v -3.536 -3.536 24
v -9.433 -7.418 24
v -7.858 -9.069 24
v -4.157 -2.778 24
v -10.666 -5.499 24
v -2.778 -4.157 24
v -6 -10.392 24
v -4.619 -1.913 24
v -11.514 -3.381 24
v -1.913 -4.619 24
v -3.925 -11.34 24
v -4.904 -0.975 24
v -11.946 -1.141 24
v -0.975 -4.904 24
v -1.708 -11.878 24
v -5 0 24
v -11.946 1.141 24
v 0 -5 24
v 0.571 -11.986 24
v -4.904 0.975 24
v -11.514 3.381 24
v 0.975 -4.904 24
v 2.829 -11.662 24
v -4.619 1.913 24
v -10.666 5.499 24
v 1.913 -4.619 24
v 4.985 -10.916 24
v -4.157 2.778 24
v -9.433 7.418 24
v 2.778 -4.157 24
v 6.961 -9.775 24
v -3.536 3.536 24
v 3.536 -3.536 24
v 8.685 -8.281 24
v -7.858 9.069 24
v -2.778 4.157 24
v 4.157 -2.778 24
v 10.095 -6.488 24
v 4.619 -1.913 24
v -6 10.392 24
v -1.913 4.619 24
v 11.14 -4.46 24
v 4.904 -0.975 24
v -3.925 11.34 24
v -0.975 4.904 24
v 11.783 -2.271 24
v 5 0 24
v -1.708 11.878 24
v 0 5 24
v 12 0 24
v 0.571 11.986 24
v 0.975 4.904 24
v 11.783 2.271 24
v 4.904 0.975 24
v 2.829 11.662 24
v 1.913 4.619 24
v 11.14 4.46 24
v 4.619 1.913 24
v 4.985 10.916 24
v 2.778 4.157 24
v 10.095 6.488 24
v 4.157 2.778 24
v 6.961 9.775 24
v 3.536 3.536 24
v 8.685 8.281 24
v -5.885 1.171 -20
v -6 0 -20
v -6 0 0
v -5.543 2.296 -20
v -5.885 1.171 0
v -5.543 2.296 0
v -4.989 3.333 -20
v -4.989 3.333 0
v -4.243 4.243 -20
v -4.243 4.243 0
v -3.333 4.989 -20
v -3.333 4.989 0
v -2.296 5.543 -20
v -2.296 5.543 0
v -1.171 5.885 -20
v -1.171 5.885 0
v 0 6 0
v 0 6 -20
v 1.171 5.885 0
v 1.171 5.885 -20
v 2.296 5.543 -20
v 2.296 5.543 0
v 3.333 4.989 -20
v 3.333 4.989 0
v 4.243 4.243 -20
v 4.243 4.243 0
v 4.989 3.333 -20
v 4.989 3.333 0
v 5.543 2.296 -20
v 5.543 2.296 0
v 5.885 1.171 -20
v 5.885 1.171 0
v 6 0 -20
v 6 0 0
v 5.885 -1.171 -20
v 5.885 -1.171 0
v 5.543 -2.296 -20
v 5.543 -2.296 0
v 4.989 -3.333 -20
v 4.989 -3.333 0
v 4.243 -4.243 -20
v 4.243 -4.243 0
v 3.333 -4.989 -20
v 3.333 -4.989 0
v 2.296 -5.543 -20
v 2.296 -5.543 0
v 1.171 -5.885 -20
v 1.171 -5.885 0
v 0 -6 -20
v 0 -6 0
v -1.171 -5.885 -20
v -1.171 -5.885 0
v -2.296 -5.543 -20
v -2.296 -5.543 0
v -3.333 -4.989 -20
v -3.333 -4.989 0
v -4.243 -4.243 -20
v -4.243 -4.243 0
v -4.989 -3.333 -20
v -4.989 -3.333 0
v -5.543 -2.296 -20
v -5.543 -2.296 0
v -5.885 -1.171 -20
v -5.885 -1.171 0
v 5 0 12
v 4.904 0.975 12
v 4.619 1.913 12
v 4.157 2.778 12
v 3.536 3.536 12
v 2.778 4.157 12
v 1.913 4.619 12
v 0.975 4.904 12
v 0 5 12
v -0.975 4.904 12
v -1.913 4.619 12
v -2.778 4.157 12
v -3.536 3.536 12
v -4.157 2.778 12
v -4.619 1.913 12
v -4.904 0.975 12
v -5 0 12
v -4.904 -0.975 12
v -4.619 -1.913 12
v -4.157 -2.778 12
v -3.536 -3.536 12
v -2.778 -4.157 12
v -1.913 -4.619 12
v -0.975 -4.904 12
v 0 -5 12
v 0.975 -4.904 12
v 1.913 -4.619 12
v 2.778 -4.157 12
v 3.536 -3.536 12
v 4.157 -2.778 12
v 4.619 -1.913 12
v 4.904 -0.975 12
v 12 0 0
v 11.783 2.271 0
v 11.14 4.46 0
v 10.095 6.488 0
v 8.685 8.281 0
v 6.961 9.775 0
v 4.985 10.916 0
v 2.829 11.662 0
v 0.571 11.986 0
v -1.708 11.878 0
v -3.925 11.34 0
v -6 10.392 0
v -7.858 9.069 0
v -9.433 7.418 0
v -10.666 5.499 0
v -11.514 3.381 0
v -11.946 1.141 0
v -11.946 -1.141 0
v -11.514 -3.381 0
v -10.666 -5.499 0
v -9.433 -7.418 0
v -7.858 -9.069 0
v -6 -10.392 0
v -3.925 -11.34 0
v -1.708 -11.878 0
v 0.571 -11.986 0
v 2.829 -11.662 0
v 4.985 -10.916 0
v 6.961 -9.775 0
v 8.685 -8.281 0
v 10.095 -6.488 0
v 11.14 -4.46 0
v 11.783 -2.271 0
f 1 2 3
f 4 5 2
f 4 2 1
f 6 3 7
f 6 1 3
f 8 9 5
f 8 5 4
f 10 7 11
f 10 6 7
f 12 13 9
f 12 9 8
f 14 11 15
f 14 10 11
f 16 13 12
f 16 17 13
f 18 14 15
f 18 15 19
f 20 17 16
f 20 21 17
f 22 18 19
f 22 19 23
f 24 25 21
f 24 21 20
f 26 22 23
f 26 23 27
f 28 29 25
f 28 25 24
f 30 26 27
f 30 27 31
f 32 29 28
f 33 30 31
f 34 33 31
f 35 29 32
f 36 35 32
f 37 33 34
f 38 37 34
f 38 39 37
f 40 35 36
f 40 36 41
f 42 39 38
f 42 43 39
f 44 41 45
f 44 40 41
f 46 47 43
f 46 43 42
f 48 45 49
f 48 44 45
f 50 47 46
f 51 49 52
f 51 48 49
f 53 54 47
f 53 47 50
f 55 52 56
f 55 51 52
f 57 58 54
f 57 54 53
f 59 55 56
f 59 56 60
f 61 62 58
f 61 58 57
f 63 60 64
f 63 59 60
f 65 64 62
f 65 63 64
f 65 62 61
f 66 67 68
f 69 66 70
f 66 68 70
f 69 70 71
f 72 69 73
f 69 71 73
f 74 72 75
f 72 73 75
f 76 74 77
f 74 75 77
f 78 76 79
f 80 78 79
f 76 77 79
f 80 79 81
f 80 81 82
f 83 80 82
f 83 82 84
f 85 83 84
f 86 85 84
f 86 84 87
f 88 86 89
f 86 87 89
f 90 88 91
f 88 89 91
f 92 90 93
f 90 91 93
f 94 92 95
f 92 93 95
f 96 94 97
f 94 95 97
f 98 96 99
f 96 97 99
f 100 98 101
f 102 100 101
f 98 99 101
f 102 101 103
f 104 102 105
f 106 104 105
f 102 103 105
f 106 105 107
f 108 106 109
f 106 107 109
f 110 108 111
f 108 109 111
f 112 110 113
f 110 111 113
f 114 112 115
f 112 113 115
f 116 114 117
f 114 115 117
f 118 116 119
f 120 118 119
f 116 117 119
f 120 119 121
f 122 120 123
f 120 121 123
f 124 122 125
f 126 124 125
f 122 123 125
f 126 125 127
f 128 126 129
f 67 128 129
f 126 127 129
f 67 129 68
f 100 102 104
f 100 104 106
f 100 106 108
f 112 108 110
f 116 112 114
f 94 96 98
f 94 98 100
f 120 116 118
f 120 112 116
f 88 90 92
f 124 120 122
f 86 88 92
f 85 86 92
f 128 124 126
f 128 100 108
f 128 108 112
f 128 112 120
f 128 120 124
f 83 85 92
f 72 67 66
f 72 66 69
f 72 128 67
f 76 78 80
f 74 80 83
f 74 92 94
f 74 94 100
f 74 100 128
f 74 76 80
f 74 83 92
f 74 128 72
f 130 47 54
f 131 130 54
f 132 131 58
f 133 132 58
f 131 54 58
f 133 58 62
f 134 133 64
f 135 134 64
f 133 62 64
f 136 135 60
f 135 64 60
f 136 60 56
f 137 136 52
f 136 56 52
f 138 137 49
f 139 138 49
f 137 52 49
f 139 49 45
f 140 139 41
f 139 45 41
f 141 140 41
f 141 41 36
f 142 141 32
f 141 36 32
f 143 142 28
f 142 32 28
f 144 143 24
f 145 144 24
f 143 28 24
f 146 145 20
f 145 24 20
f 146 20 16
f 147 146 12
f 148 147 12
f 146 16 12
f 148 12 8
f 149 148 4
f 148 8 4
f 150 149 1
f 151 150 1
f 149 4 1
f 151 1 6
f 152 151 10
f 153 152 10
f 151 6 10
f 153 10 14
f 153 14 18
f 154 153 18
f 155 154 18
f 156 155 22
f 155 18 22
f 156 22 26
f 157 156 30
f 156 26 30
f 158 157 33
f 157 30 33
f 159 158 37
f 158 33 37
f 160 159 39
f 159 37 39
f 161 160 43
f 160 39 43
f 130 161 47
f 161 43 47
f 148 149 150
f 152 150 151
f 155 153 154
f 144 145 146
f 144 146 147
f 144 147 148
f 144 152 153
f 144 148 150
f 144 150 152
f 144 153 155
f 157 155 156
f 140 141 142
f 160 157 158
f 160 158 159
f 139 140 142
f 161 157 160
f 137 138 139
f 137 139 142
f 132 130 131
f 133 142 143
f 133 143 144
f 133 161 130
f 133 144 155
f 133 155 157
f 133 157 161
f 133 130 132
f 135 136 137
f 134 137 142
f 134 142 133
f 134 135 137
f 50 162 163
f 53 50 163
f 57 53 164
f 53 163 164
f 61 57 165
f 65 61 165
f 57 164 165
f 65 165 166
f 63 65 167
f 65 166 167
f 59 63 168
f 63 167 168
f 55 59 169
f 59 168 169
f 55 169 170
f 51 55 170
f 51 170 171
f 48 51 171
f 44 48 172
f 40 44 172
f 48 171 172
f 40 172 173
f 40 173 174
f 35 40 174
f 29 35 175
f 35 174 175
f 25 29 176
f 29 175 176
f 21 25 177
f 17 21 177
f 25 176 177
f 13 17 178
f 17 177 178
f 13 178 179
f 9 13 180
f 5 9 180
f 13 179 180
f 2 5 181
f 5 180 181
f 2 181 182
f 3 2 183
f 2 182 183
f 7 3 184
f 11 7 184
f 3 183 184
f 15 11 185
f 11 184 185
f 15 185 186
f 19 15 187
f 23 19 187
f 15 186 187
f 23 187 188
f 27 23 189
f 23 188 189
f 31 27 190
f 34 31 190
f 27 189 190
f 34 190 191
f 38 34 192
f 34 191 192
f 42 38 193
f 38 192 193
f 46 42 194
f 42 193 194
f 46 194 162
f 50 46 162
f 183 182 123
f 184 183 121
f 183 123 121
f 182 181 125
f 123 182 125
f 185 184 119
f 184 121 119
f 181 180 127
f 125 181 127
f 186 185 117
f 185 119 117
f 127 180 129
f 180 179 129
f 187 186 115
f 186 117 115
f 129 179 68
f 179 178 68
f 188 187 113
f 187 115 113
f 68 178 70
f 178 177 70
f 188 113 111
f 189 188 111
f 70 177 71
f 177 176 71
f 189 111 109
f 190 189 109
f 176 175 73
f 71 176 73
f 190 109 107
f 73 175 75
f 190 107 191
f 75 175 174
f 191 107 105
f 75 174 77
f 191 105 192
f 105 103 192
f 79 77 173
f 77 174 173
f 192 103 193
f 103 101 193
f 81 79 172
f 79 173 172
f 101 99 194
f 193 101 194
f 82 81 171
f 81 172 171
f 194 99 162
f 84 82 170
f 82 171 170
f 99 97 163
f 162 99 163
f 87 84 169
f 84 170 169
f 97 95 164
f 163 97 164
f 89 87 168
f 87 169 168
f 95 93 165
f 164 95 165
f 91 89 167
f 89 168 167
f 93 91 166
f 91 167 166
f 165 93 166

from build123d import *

# Parameters (mm, degrees)
SKETCH1_R           = 12
BOSS_EXTRUDE1_DEPTH = 24
SKETCH2_R           = 5
CUT_EXTRUDE1_DEPTH  = 12
SKETCH3_R           = 6
BOSS_EXTRUDE2_DEPTH = 20


with BuildPart() as part:
    # Sketch1 → Boss-Extrude1 (new body)
    with BuildSketch(Plane.XY):
        Circle(SKETCH1_R)
    extrude(amount=BOSS_EXTRUDE1_DEPTH)

    # Sketch2 → Cut-Extrude1 (cut)
    with BuildSketch(Plane.XY.offset(24)):
        Circle(SKETCH2_R)
    extrude(amount=-CUT_EXTRUDE1_DEPTH, mode=Mode.SUBTRACT)

    # Sketch3 → Boss-Extrude2 (add)
    with BuildSketch(Plane(origin=(0, 0, 0), x_dir=(-1, 0, 0), z_dir=(0, 0, -1))):
        Circle(SKETCH3_R)
    extrude(amount=BOSS_EXTRUDE2_DEPTH)


solid = part.part
